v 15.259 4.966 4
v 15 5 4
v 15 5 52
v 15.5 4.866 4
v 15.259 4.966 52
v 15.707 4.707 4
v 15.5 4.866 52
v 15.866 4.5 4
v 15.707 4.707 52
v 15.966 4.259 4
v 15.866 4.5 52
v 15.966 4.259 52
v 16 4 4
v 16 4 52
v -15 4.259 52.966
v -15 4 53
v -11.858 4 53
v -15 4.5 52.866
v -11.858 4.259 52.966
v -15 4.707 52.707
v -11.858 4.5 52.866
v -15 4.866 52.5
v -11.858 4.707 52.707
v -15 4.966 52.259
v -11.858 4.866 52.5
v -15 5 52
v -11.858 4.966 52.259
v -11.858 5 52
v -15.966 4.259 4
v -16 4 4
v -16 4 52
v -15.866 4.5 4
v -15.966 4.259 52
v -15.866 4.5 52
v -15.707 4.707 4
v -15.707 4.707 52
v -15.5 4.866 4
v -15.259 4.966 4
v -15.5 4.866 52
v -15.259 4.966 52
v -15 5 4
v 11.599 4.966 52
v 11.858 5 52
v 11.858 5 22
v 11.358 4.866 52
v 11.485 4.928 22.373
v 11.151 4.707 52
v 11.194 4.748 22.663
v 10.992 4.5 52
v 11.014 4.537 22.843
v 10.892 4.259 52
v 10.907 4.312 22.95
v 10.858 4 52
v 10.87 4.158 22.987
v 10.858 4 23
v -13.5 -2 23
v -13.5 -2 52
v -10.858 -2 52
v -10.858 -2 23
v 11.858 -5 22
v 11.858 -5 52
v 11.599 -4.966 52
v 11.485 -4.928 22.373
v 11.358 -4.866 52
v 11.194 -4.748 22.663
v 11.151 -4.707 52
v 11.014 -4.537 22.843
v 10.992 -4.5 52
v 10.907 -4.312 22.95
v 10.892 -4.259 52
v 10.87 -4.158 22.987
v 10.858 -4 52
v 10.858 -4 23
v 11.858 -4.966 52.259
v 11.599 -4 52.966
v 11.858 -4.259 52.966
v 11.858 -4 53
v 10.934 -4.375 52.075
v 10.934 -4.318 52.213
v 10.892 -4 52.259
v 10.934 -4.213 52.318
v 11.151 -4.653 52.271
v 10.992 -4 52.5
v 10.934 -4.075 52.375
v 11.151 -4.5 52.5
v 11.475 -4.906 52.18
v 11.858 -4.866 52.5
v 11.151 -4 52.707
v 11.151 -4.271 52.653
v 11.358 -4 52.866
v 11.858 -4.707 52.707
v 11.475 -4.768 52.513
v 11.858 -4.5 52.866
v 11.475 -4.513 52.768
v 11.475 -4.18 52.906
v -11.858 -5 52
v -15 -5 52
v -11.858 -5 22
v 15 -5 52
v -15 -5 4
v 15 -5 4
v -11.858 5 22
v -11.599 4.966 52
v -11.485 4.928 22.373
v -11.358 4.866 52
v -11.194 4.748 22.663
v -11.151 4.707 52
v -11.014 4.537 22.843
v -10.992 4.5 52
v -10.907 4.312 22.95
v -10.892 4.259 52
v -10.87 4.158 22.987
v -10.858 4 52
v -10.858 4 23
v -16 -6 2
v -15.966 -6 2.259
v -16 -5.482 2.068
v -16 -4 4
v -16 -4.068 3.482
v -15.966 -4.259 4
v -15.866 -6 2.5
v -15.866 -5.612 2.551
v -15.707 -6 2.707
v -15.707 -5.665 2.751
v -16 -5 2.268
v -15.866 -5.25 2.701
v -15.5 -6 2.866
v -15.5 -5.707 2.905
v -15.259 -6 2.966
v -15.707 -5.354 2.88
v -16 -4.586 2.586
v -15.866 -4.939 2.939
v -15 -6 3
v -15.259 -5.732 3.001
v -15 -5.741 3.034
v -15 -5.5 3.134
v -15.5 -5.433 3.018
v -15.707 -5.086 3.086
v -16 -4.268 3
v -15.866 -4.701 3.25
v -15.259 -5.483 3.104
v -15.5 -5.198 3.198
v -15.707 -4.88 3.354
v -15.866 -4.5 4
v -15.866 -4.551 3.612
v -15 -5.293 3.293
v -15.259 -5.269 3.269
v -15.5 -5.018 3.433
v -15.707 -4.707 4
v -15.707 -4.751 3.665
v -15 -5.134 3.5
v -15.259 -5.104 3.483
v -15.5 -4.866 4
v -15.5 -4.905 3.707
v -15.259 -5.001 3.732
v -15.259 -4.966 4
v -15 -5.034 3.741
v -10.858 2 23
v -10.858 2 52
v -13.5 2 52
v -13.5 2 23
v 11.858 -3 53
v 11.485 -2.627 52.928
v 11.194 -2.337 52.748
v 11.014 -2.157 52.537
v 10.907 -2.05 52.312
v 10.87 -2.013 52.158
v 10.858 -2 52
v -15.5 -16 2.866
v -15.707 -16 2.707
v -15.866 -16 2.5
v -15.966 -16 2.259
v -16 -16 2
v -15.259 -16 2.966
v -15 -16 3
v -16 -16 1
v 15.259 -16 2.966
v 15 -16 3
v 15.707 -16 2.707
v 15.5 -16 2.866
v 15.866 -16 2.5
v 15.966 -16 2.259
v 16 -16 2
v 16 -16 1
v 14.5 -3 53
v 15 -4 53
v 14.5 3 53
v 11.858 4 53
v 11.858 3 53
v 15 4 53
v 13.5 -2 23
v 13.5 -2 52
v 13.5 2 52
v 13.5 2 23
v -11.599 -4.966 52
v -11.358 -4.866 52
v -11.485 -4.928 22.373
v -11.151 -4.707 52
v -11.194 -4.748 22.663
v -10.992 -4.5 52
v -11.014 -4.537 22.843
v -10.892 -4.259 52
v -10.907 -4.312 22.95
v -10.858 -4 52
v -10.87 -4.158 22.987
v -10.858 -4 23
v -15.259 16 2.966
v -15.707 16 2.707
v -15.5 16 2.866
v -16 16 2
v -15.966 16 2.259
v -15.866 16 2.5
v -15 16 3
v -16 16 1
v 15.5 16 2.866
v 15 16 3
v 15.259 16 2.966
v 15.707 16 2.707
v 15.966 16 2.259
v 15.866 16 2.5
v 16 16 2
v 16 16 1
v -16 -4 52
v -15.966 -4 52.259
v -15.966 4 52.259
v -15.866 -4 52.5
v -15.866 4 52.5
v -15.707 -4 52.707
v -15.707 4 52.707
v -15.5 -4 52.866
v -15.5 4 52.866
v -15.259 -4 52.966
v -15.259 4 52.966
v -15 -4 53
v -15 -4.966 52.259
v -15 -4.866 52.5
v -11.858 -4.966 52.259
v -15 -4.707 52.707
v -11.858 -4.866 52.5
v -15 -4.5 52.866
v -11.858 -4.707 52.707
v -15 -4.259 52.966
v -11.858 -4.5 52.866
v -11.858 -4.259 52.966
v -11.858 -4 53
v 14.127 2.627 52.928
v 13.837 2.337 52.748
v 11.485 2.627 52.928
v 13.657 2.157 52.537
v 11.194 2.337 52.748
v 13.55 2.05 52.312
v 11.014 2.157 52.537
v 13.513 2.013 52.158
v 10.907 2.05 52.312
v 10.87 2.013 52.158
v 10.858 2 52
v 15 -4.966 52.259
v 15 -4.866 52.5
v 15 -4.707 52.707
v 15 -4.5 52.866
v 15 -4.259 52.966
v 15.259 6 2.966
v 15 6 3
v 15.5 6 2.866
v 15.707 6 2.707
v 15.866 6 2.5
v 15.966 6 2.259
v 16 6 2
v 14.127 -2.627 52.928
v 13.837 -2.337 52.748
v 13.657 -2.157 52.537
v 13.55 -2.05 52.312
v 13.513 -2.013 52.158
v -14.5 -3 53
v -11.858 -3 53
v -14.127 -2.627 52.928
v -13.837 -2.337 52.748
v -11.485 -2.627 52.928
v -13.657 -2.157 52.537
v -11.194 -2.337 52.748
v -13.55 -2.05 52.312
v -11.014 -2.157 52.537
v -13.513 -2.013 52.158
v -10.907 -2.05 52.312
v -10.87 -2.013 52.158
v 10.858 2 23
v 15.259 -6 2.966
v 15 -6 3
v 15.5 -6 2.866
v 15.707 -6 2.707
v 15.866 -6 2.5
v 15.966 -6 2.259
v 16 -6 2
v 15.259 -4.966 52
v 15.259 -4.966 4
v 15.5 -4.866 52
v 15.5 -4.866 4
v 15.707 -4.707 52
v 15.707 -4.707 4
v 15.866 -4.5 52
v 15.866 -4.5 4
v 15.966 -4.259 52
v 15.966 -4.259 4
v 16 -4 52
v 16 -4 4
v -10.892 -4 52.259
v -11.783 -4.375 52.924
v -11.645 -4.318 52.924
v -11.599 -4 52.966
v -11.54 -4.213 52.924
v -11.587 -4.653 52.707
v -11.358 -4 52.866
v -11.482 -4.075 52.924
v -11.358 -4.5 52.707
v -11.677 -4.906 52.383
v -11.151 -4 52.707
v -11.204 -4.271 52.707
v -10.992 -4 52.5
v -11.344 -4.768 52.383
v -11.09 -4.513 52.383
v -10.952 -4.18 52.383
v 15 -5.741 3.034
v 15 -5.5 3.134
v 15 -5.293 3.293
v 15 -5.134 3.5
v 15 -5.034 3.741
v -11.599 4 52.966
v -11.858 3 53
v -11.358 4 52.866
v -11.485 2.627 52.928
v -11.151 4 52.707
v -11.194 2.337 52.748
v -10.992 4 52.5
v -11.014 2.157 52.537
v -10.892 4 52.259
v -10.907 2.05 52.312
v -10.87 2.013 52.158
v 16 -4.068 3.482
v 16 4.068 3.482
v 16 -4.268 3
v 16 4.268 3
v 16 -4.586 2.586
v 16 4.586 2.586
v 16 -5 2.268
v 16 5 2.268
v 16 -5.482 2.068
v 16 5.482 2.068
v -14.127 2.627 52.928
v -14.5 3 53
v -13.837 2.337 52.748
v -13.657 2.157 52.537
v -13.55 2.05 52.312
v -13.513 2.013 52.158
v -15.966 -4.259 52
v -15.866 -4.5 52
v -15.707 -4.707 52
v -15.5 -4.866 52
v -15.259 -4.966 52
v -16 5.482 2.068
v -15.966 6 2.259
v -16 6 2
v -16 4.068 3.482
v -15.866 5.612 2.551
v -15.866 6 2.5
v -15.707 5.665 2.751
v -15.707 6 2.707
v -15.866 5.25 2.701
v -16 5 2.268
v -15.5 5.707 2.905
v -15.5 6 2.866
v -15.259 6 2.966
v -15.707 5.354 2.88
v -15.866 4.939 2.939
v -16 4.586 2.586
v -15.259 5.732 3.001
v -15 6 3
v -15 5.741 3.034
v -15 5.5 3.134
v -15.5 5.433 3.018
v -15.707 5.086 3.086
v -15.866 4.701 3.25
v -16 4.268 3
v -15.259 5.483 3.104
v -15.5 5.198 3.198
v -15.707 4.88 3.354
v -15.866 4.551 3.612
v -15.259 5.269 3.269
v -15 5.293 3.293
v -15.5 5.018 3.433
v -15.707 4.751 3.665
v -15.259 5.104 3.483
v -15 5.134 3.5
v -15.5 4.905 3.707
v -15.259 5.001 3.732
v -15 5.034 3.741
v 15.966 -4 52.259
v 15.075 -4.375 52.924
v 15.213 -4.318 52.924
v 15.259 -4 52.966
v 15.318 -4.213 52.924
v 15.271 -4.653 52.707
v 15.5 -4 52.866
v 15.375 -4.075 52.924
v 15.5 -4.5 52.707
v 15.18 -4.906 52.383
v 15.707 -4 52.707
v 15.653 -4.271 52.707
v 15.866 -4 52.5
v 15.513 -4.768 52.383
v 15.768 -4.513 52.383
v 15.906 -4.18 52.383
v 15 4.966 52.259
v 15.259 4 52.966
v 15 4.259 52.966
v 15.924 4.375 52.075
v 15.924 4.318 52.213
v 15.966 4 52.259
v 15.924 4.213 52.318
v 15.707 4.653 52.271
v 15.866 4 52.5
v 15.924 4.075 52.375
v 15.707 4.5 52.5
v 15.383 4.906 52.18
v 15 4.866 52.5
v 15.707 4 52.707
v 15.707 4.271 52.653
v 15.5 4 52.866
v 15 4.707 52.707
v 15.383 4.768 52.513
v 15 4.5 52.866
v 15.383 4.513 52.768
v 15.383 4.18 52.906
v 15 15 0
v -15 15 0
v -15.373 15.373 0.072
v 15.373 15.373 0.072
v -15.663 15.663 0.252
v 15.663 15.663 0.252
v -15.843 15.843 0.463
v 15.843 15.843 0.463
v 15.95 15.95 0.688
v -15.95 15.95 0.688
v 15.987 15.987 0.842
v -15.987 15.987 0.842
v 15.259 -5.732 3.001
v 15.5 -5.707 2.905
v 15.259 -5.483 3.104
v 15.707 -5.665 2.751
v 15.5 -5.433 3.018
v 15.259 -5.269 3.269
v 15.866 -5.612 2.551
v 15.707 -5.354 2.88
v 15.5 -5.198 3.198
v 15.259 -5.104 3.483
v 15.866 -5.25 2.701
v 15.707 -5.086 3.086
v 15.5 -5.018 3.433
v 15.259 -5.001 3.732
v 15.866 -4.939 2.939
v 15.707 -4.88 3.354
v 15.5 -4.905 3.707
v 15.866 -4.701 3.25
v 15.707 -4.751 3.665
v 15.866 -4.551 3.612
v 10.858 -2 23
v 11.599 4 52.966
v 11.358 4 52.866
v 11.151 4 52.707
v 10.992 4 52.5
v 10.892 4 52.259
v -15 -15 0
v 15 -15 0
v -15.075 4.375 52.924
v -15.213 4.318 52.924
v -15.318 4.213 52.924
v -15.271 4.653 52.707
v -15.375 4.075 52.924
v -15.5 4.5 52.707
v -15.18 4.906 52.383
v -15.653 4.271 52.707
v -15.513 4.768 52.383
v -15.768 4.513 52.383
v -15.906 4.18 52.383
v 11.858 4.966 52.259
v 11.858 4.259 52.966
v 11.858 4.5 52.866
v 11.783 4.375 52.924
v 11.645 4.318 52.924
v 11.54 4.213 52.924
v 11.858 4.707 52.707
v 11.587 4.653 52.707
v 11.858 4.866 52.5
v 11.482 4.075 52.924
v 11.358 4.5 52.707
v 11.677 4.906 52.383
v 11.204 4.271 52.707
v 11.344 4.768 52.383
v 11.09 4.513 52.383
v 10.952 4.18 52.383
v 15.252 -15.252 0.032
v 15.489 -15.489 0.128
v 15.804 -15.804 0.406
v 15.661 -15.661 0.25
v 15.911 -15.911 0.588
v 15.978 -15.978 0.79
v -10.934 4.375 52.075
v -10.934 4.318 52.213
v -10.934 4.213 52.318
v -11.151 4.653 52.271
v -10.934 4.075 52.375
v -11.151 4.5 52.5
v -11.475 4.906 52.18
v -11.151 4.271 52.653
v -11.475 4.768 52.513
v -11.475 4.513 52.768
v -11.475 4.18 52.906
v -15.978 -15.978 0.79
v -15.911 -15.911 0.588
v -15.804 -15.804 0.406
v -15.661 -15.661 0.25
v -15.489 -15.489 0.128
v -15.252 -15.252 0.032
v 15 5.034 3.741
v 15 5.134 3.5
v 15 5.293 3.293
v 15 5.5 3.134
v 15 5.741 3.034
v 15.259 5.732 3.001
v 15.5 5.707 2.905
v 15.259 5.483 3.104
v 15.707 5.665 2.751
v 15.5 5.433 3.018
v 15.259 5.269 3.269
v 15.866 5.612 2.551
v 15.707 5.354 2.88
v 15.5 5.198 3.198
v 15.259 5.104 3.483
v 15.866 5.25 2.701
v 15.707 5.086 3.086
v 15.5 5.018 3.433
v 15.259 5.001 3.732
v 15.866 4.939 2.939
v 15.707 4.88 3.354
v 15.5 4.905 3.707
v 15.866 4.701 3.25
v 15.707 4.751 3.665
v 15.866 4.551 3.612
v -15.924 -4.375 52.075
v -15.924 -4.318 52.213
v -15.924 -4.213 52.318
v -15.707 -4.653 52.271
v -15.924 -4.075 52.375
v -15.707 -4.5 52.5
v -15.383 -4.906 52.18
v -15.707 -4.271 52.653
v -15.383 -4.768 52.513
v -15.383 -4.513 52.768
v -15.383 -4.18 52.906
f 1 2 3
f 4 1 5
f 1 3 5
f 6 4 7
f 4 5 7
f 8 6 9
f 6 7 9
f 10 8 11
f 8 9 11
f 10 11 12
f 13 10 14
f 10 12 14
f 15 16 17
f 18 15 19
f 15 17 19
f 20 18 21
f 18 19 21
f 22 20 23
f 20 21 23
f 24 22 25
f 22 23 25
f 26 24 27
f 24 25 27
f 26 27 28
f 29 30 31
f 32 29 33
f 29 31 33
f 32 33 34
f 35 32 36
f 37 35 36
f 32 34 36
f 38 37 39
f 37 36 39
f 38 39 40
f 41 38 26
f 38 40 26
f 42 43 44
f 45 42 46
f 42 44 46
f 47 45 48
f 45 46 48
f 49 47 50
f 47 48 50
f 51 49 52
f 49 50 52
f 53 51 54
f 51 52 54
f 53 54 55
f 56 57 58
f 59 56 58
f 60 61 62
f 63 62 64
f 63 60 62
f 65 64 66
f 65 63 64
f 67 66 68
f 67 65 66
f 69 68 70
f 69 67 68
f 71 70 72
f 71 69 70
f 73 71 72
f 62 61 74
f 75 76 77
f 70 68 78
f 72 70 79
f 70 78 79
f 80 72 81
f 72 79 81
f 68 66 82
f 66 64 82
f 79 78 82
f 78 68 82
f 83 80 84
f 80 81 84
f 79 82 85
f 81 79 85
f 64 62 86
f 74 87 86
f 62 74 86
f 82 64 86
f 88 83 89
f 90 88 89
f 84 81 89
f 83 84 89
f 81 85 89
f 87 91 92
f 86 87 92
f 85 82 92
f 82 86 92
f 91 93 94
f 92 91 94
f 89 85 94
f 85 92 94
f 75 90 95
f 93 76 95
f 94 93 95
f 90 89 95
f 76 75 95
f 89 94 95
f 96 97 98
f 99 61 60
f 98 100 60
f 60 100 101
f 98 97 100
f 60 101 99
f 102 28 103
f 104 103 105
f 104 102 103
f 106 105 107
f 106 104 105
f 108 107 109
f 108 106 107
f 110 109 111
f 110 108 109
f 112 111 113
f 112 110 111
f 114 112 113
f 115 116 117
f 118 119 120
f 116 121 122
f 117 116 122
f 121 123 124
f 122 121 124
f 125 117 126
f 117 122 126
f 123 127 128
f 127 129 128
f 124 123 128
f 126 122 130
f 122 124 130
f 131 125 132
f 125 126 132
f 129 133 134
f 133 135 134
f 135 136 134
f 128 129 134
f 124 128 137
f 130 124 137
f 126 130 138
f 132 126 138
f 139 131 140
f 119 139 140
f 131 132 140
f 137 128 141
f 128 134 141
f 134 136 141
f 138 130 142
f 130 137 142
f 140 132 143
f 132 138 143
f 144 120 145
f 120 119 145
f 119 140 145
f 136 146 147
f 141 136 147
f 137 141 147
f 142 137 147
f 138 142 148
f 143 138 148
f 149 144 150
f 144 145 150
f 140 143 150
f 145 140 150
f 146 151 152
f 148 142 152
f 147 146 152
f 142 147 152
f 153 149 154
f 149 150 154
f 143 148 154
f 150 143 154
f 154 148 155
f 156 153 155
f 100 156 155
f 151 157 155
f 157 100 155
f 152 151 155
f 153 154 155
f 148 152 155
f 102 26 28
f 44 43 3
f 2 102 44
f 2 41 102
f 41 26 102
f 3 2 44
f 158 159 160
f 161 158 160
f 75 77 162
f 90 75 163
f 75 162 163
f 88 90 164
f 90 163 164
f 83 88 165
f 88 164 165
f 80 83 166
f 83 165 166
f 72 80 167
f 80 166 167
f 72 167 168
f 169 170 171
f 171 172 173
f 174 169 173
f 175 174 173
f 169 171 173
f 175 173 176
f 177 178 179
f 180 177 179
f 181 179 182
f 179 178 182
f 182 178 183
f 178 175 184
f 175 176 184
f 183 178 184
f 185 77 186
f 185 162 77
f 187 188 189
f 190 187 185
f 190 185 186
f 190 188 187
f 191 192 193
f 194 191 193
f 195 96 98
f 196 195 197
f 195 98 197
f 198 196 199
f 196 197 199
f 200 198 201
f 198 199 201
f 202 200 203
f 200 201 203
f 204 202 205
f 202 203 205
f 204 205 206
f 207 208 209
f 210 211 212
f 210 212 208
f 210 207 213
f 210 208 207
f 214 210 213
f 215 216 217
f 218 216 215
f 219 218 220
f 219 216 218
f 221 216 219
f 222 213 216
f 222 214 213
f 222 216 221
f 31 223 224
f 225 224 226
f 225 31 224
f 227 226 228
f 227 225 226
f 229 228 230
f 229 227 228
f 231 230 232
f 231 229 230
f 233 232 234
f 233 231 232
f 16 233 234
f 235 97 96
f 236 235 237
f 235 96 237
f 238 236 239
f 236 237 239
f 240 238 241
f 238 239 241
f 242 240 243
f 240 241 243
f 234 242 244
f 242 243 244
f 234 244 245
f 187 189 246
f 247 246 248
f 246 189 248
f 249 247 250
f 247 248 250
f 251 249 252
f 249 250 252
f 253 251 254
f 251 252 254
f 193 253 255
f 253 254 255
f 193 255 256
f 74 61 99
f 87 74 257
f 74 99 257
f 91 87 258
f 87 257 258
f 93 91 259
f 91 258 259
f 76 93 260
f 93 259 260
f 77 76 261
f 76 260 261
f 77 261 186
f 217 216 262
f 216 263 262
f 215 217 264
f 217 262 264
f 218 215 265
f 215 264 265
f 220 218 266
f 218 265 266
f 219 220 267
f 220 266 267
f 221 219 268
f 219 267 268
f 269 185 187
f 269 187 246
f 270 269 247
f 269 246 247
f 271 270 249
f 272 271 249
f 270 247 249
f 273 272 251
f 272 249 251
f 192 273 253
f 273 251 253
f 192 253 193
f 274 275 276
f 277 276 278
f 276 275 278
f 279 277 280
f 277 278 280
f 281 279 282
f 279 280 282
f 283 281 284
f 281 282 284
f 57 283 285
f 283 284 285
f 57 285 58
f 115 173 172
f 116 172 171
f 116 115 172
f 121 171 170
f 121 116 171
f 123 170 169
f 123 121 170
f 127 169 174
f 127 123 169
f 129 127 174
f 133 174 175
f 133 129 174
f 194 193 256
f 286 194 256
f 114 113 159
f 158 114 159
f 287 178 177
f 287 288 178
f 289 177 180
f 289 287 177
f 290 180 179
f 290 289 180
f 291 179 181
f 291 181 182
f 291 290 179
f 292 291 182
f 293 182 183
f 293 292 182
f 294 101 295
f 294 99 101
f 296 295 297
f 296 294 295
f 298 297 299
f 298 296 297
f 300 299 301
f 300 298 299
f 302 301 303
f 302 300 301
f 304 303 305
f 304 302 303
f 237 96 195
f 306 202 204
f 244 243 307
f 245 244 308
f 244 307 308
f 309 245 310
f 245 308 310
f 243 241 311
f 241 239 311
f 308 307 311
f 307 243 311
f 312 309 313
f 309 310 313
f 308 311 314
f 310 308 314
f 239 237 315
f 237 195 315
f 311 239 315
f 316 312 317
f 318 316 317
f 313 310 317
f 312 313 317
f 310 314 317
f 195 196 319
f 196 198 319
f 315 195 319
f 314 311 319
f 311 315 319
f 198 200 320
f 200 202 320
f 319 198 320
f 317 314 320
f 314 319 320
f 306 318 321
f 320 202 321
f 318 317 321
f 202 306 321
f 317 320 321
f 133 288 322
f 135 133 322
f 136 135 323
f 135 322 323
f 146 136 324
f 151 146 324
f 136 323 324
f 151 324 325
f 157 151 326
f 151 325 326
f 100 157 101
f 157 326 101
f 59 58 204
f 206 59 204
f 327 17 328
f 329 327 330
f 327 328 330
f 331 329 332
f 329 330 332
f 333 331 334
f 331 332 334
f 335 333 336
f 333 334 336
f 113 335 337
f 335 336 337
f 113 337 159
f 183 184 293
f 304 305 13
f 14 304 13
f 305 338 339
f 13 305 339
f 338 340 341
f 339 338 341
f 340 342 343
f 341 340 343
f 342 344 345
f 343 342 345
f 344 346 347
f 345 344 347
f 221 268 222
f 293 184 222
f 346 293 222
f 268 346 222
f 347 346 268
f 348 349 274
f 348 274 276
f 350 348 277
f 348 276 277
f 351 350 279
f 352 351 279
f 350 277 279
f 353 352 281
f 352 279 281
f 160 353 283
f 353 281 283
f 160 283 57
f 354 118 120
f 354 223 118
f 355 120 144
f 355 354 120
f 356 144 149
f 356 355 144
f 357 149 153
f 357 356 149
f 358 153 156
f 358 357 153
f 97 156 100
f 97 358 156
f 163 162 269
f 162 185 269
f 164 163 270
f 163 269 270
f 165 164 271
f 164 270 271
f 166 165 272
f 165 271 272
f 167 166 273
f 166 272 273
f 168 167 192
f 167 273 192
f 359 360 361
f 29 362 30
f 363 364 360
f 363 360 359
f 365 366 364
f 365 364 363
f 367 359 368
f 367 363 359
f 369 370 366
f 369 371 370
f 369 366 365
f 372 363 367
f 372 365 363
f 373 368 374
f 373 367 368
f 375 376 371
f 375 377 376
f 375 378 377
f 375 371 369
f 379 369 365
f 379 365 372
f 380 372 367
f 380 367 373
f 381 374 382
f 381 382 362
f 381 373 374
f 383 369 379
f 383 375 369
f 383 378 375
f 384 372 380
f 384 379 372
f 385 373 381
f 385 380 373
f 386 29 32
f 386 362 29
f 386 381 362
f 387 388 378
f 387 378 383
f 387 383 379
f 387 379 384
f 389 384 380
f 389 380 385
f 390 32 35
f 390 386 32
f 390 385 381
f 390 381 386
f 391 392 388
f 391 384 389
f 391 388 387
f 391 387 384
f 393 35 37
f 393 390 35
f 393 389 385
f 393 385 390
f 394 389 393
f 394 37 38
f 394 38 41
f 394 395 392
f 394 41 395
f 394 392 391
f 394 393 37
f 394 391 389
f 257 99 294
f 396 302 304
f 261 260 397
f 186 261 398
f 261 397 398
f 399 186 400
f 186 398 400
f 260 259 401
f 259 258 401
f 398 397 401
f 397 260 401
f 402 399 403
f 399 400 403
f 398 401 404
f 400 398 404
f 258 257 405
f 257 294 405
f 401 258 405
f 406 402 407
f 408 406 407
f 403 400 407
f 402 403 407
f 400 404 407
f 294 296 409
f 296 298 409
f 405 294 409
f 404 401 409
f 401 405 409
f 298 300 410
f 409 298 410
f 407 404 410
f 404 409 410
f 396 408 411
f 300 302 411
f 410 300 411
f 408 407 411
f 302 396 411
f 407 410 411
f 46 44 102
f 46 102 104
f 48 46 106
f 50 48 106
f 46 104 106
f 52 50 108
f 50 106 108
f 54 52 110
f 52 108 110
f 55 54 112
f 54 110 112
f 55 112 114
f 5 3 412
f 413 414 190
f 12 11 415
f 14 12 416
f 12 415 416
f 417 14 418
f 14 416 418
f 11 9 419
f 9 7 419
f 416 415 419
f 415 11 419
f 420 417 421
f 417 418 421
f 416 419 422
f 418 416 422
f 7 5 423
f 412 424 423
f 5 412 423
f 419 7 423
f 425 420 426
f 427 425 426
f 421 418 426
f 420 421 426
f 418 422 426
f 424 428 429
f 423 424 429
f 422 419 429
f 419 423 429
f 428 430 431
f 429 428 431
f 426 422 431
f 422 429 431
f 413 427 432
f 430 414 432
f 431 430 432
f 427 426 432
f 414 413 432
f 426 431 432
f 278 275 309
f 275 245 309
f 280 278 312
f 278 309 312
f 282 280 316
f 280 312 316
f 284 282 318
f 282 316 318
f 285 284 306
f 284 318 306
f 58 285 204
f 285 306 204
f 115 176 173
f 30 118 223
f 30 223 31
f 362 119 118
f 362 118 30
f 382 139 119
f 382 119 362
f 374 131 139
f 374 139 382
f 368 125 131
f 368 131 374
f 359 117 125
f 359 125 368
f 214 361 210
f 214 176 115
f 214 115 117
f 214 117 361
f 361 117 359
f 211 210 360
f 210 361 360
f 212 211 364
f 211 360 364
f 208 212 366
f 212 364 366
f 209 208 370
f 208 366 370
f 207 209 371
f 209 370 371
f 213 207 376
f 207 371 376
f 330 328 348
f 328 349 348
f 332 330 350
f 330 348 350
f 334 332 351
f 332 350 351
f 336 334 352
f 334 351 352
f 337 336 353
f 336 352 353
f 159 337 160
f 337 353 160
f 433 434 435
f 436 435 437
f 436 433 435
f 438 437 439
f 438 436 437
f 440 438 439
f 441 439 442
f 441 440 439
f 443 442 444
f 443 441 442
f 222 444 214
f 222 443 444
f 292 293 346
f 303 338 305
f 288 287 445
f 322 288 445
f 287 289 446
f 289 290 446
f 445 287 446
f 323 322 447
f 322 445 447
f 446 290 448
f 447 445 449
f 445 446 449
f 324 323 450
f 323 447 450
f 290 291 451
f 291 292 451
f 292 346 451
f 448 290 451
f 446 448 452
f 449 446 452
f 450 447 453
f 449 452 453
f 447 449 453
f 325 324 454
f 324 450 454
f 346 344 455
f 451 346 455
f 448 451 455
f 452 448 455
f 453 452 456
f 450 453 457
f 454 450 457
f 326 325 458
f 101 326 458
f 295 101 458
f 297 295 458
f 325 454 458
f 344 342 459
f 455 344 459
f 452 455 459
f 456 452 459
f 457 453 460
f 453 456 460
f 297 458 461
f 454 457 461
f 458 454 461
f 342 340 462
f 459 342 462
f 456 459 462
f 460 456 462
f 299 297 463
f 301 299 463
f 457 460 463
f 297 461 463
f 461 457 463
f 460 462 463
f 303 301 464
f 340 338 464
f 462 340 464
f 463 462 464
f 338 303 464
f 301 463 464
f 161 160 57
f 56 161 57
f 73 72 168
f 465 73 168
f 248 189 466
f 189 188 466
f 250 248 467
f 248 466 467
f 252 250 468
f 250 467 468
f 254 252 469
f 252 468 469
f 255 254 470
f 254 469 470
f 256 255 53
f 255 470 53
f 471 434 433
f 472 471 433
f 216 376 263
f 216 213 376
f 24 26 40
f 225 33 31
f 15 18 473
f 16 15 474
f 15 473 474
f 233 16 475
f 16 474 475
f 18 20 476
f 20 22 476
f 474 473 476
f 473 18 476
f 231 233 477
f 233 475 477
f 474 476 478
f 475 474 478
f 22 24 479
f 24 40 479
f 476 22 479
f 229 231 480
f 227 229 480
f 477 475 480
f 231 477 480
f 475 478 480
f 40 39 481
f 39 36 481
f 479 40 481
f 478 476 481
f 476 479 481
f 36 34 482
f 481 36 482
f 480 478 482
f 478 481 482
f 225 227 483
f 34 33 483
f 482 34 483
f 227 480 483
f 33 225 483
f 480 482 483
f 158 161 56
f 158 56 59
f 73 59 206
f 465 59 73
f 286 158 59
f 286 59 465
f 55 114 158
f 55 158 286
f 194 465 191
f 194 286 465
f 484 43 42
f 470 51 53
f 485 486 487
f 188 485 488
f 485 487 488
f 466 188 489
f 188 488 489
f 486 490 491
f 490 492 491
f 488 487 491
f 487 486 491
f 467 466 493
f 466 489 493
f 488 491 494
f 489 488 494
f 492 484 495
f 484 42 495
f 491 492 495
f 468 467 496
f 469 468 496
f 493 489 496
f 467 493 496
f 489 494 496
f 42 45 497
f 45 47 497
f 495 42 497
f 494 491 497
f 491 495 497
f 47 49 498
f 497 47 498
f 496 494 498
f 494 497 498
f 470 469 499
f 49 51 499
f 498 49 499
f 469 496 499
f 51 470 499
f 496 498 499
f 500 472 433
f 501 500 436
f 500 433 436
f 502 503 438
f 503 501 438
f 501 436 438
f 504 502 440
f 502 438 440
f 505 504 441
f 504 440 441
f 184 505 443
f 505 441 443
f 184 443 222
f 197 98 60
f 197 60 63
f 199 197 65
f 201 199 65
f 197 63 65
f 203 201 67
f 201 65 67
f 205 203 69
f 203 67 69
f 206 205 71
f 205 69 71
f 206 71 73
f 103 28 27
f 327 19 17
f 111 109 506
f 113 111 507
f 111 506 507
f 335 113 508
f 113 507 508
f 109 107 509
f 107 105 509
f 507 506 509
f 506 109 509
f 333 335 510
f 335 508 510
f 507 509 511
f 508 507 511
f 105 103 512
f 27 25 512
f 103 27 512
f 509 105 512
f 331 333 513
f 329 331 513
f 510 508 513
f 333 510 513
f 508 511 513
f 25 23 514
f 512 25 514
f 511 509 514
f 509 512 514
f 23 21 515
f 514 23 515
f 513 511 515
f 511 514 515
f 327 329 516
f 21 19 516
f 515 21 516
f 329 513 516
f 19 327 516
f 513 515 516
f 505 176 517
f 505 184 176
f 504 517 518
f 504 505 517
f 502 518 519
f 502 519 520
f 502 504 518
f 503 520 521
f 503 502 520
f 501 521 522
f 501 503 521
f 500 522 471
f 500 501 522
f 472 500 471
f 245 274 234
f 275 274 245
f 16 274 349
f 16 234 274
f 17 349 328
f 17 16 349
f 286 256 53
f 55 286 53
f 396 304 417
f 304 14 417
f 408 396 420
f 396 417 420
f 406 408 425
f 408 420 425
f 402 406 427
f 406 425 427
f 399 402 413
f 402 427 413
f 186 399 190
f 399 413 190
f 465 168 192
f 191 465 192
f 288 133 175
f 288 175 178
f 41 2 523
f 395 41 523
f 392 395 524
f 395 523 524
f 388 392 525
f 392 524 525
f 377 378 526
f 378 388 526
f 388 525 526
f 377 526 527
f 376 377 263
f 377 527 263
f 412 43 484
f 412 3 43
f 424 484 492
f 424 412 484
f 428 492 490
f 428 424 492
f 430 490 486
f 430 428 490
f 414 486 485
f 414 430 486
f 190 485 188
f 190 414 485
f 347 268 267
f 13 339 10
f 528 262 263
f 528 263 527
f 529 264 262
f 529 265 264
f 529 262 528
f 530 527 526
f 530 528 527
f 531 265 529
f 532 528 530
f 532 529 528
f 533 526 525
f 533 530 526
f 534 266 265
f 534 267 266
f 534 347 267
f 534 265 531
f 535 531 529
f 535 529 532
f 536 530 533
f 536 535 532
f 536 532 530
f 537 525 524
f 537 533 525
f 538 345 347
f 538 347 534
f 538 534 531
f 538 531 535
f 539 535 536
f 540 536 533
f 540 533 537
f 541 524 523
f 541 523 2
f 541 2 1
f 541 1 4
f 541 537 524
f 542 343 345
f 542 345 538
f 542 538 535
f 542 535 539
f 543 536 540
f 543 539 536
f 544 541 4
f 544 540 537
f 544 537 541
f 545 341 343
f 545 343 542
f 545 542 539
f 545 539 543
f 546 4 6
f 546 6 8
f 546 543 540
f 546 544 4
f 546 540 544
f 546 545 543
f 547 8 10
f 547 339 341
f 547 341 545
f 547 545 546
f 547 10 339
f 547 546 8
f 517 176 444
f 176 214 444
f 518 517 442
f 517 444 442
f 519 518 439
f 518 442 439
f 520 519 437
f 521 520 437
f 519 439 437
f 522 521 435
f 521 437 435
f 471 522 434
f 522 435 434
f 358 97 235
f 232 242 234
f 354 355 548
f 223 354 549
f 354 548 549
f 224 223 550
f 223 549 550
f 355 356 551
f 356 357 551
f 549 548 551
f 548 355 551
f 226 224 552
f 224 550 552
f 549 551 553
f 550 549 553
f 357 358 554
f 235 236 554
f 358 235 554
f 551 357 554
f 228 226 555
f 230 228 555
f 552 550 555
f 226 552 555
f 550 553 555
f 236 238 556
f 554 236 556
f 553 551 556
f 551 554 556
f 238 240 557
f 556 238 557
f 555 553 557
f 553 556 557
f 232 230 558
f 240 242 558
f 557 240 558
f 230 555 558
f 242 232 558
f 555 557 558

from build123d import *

# Parameters (mm, degrees)
F0_W     = 32
F0_H     = 32
F1_DEPTH = 3
F2_W     = 32
F2_H     = 10
F3_DEPTH = 50
F5_DEPTH = 30
F6_F1_R  = 1
F6_F2_R  = 1


with BuildPart() as f1:
    # F0 (on Top) → F1 (new body)
    with BuildSketch(Plane.XY):
        Rectangle(F0_W, F0_H)
    extrude(amount=F1_DEPTH)

    # F2 (on face) → F3 (join)
    with BuildSketch(Plane.XY.offset(3)):
        Rectangle(F2_W, F2_H)
    extrude(amount=F3_DEPTH)

    # F4 (on face) → F5 (cut)
    with BuildSketch(Plane.XY.offset(53)):
        Polygon((10.8576942235, 5), (-10.8576942235, 5), (-10.8576942235, 2), (-13.5, 2), (-13.5, -2), (-10.8576942235, -2), (-10.8576942235, -5), (10.8576942235, -5), (10.8576942235, -2), (13.5, -2), (13.5, 2), (10.8576942235, 2), align=None)
    extrude(amount=-F5_DEPTH, mode=Mode.SUBTRACT)

    # F6: fillet of radius 1 on 32 edges, made by hand

    # F6_f1
    f6_f1_edges = [f1.edges().sort_by_distance(p)[0] for p in [
        (0, -5, 3),
        (0, 5, 3),
    ]]
    fillet(f6_f1_edges, radius=F6_F1_R)

    # F6_f2
    f6_f2_edges = [f1.edges().sort_by_distance(p)[0] for p in [
        (0, 16, 0),
        (-16, 0, 0),
        (0, -16, 0),
        (16, 0, 0),
        (16, -5, 28.5),
        (13.4288471118, -5, 53),
        (10.8576942235, -5, 38),
        (0, -5, 23),
        (-10.8576942235, -5, 38),
        (-13.4288471118, -5, 53),
        (-16, -5, 28.5),
        (-16, 5, 28.5),
        (-13.4288471118, 5, 53),
        (-10.8576942235, 5, 38),
        (0, 5, 23),
        (10.8576942235, 5, 38),
        (13.4288471118, 5, 53),
        (16, 5, 28.5),
        (16, 0, 53),
        (10.8576942235, -3.5, 53),
        (12.1788471118, -2, 53),
        (13.5, 0, 53),
        (12.1788471118, 2, 53),
        (10.8576942235, 3.5, 53),
        (-10.8576942235, 3.5, 53),
        (-12.1788471118, 2, 53),
        (-13.5, 0, 53),
        (-12.1788471118, -2, 53),
        (-10.8576942235, -3.5, 53),
        (-16, 0, 53),
        (16, 5.2928932188, 3.2928932188),
        (-16, 5.2928932188, 3.2928932188),
        (-16, -5.2928932188, 3.2928932188),
        (16, -5.2928932188, 3.2928932188),
    ]]
    fillet(f6_f2_edges, radius=F6_F2_R)


solid = f1.part
